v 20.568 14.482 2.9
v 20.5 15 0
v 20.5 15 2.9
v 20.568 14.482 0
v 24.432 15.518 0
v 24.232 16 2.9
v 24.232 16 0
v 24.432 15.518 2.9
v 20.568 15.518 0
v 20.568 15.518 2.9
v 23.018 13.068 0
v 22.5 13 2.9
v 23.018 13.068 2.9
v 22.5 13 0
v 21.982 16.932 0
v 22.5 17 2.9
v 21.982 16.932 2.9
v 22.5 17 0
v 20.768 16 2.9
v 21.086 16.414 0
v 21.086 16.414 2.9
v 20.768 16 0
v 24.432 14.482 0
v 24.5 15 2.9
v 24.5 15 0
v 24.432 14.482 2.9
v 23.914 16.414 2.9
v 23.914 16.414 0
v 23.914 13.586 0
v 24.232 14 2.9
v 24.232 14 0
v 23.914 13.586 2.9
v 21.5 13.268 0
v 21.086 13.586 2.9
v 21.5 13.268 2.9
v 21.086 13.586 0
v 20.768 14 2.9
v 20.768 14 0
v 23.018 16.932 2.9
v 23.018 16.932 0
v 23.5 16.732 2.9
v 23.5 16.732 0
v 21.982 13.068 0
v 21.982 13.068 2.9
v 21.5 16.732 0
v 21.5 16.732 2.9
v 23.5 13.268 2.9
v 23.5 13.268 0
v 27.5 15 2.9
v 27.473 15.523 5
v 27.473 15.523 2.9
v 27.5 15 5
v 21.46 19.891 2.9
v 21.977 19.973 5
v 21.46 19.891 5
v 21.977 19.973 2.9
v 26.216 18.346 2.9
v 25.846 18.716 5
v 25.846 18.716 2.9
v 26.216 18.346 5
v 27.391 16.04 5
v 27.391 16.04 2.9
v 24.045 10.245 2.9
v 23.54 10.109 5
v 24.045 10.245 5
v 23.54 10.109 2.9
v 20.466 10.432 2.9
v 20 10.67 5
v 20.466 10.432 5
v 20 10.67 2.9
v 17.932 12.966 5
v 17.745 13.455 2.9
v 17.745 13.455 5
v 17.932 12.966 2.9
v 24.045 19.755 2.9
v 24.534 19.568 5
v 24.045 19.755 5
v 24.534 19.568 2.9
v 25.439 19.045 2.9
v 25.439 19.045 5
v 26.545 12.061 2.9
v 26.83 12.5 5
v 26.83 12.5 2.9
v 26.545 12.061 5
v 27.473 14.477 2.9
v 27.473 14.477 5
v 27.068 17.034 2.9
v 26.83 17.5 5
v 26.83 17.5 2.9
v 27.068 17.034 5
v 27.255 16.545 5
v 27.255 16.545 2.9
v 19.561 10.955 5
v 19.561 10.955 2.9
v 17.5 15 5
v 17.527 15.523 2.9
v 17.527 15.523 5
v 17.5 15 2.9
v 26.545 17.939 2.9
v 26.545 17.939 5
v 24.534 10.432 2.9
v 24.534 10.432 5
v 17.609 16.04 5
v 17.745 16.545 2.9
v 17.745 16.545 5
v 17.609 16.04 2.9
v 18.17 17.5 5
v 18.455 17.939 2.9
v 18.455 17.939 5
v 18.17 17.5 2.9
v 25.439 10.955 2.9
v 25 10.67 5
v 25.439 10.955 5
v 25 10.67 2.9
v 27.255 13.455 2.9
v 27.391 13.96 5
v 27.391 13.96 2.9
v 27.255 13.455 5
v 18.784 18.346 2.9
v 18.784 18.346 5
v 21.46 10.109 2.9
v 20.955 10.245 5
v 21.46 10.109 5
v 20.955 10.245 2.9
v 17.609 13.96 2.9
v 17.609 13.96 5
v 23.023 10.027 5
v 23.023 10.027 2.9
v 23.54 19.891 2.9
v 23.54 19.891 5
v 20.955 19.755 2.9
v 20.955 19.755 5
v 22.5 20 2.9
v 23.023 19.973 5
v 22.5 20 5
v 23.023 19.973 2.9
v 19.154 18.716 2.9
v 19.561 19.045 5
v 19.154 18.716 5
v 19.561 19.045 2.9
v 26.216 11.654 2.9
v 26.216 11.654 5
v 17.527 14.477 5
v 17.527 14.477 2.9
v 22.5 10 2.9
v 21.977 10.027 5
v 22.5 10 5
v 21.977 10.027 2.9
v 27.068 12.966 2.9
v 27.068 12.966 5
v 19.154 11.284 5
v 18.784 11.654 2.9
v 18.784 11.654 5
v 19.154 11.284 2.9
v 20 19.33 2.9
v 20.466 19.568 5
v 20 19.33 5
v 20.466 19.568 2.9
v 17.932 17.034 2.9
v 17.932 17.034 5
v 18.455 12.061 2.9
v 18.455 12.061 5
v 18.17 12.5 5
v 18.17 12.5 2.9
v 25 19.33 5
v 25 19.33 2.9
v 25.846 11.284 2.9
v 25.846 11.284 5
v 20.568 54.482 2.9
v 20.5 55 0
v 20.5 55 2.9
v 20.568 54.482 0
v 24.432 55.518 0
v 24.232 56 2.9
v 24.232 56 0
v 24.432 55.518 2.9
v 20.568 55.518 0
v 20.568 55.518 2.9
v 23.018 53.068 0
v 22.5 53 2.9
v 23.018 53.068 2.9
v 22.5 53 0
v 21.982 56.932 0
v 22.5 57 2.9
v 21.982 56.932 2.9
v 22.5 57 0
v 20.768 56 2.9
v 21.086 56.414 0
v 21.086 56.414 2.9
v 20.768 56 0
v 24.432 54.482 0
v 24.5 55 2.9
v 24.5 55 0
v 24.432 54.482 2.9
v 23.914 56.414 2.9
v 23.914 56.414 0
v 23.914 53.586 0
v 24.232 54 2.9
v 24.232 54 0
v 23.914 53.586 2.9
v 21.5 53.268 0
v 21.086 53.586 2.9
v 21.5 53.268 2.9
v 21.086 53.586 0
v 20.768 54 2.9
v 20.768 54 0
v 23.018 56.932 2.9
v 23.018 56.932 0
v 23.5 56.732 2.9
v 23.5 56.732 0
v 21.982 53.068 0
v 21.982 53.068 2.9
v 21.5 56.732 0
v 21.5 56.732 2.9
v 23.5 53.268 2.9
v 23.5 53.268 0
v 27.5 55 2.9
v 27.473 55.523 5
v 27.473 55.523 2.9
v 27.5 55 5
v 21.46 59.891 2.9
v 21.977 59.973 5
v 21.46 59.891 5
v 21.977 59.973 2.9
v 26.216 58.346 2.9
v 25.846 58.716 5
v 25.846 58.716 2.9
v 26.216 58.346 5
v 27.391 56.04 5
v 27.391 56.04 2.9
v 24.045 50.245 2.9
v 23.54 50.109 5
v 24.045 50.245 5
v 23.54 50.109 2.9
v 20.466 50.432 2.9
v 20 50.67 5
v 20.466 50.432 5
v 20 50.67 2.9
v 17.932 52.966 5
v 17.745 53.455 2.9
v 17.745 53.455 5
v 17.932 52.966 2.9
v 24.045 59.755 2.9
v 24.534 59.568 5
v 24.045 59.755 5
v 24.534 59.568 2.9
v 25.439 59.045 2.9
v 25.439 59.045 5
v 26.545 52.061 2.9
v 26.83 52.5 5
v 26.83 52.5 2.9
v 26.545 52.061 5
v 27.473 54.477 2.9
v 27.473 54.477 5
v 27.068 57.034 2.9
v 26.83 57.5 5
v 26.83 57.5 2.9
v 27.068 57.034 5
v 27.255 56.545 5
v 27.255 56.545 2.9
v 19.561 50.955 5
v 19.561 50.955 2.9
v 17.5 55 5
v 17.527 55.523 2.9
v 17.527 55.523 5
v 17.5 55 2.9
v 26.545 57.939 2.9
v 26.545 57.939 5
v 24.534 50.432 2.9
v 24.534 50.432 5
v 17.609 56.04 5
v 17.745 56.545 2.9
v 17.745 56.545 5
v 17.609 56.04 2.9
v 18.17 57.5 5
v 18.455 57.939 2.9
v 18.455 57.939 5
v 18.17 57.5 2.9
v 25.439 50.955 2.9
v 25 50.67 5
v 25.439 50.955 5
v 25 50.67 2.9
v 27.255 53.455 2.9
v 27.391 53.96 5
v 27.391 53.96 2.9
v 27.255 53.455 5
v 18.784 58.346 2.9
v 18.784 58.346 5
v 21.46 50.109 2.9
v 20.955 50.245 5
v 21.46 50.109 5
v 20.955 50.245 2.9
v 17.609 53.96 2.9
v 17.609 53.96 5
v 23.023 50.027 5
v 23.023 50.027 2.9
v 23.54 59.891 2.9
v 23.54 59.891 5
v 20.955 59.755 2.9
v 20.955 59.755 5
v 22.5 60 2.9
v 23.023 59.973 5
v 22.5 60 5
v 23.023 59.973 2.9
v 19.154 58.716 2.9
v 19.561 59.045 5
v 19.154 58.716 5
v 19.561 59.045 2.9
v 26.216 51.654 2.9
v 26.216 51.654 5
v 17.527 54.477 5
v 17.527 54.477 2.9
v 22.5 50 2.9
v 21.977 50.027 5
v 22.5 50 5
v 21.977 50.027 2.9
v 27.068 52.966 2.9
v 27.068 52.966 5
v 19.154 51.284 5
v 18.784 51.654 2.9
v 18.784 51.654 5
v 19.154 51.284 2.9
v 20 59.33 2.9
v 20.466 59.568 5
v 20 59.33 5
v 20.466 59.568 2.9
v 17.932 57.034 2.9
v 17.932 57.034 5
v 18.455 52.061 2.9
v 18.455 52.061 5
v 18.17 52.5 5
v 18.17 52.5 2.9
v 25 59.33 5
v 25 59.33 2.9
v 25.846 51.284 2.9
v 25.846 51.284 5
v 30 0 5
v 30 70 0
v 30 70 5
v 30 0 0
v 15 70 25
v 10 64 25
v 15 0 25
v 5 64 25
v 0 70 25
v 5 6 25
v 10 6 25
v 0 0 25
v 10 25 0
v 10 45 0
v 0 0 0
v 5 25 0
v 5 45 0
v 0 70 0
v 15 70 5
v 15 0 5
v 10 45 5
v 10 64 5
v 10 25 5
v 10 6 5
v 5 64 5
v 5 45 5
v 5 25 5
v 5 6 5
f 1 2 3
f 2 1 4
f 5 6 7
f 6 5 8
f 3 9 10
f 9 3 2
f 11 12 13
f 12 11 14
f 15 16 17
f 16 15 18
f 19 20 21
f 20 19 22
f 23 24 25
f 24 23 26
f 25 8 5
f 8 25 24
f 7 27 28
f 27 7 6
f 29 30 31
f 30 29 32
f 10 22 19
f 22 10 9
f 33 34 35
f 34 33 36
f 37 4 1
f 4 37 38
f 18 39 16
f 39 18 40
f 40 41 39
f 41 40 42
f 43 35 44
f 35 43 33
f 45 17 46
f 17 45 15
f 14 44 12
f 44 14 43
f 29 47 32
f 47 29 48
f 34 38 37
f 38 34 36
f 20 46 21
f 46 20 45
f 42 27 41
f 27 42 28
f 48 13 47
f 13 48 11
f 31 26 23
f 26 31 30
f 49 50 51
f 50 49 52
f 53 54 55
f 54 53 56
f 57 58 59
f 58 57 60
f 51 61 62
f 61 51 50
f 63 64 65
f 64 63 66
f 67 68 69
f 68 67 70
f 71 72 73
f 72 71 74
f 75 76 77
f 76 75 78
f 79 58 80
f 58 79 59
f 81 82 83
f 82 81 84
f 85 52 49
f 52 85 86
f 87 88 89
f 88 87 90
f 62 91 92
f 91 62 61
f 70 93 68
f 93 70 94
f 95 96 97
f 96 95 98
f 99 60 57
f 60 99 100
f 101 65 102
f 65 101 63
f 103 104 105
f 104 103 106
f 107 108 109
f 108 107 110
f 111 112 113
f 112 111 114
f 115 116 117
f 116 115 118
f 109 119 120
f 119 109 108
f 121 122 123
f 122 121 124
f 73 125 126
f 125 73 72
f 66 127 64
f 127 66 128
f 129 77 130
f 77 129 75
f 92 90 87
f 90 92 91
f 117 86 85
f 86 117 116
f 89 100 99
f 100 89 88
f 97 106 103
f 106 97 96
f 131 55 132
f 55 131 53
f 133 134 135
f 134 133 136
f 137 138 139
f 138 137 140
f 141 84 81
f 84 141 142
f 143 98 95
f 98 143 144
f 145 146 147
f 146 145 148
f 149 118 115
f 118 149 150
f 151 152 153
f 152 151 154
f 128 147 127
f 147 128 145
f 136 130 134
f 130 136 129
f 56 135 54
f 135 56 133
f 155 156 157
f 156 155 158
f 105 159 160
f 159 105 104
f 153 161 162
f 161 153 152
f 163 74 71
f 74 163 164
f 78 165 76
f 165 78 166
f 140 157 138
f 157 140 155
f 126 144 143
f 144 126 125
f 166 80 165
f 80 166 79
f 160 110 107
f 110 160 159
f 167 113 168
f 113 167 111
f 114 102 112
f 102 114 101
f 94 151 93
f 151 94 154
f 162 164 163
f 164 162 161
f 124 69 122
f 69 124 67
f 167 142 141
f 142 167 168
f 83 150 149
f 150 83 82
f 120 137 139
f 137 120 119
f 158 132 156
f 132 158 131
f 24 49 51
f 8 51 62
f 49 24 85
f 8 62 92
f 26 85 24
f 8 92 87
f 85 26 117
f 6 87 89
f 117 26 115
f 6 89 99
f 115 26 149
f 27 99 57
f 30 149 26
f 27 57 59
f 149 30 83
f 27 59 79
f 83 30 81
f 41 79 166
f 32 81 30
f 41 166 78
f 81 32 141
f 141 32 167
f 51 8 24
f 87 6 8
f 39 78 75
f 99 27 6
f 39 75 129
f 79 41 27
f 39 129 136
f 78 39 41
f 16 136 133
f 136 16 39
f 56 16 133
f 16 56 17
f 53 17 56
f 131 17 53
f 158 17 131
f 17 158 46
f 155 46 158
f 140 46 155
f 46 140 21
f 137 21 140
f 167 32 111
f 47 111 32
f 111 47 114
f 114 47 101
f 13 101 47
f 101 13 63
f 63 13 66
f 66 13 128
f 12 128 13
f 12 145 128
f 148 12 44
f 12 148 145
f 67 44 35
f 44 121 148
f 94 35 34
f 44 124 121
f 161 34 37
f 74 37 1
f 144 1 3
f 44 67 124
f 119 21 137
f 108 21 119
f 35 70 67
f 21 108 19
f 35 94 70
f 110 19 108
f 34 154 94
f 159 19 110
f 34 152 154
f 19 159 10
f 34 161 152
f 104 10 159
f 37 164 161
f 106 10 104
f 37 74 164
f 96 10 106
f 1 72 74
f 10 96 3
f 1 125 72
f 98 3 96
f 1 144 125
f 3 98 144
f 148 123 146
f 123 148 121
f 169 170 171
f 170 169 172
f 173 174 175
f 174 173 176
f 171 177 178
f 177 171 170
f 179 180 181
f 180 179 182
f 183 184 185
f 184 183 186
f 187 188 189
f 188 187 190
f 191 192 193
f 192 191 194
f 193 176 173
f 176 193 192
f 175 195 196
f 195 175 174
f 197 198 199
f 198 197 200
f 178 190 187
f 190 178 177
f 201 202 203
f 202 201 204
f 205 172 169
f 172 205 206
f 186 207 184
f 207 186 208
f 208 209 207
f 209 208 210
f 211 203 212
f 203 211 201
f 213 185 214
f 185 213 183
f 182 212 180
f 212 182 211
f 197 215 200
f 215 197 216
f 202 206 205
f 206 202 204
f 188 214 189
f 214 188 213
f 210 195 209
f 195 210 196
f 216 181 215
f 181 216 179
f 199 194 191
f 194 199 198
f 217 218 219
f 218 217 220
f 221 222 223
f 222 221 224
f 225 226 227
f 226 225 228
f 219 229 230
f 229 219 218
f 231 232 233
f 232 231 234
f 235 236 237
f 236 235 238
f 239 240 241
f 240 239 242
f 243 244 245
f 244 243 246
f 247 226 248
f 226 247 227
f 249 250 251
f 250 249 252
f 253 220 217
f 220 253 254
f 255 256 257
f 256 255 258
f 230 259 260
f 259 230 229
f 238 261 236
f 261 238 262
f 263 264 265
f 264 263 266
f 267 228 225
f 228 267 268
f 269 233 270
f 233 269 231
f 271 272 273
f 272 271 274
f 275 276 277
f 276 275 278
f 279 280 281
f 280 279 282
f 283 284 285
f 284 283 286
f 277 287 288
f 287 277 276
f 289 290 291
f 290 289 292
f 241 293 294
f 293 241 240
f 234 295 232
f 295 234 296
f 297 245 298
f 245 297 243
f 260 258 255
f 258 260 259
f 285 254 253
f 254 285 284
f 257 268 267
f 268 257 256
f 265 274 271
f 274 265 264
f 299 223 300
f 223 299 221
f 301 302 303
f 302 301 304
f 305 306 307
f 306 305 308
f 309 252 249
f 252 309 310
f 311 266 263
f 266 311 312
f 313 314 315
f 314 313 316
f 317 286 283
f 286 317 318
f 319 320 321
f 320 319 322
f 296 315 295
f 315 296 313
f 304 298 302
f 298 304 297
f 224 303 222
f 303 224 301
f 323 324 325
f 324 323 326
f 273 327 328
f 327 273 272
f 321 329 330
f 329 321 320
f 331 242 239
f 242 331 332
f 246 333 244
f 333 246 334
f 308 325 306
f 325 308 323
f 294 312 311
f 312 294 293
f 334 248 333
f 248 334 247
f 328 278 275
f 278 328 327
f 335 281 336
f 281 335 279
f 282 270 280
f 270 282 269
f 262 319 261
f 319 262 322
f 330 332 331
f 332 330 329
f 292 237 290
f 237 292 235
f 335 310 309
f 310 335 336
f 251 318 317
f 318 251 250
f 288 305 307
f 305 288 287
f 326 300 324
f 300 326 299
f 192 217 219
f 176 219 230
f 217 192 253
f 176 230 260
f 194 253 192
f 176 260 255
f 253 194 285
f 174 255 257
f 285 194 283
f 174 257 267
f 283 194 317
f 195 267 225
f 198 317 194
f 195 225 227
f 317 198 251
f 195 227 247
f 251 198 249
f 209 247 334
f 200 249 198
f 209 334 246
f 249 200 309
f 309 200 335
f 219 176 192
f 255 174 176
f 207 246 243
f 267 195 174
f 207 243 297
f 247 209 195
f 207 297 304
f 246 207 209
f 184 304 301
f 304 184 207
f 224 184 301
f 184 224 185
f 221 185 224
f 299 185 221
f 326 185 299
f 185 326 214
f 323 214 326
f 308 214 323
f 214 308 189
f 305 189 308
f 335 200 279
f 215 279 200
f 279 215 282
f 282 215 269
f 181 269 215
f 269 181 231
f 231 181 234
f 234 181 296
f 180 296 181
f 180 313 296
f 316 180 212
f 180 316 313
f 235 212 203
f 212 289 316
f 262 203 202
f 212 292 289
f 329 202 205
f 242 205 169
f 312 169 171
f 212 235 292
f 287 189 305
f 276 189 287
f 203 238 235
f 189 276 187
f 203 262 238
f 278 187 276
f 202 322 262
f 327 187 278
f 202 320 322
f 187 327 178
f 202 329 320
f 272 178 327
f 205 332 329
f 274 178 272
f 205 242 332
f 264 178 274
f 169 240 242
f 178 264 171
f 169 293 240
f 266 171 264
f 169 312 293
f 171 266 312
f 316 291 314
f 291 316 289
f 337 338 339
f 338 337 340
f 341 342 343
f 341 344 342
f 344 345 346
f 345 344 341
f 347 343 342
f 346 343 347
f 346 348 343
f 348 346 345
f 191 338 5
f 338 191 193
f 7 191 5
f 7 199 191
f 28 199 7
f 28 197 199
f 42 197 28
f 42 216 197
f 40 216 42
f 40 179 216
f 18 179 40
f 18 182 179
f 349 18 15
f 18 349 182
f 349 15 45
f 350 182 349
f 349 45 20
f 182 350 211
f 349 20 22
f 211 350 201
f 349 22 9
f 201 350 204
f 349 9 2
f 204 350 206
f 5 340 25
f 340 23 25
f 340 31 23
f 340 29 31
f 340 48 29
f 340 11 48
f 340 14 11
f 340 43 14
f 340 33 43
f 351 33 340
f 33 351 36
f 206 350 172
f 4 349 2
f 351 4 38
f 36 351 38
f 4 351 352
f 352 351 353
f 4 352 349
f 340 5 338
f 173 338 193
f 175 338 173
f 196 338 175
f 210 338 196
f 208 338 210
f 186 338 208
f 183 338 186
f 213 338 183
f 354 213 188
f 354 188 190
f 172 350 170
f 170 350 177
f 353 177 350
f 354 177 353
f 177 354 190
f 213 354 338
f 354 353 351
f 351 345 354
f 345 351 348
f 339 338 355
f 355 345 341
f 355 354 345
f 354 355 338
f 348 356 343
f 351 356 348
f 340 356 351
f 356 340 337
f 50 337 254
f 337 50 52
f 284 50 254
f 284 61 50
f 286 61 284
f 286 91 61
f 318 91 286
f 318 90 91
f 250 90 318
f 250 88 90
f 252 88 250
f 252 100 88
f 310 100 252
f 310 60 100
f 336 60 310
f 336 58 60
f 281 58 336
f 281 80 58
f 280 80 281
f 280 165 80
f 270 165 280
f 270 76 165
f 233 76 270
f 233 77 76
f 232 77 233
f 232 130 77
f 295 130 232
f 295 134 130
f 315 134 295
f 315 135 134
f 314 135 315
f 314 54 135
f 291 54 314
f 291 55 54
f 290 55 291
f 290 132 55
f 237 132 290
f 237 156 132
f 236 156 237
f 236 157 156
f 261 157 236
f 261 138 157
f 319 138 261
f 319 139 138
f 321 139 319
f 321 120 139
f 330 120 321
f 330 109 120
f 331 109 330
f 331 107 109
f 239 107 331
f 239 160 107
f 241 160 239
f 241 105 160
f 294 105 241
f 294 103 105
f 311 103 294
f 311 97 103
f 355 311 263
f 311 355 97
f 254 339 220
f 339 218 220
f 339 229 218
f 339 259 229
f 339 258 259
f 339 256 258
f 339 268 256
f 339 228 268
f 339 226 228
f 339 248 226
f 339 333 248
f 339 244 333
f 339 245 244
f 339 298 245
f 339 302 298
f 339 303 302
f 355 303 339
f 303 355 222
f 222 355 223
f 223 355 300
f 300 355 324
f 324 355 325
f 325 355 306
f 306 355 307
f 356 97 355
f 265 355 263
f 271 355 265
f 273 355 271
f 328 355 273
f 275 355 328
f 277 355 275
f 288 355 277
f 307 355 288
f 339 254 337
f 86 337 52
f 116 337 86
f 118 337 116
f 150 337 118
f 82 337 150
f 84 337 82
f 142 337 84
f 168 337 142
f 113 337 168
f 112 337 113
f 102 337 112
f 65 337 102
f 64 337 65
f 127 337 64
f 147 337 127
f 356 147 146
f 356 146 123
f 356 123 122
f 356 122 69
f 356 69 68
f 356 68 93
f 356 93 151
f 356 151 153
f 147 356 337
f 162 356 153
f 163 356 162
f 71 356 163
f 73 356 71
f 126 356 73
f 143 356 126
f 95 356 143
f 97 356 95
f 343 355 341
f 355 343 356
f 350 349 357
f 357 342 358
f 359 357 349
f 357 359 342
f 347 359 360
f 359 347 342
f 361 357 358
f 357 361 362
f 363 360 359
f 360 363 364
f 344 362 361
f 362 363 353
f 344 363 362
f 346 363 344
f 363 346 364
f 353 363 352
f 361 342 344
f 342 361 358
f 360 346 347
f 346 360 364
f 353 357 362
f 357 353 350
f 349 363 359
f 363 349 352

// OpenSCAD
difference(){
    cube([30,70,25]);
    translate([15,-0.5,5])cube([30,71,30]);
    translate([5, 6, 5])cube([5,58,30]);
    translate([5, 25, -0.5])cube([5,20,30]);
    translate([22.5,0,0]){
        translate([0,15,-.1])csavarfurat();
        translate([0,55,-.1])csavarfurat();
    }
}

module csavarfurat(){
    cylinder(r=2, h=4,$fn=24);
    translate([0,0,3])cylinder(r=5,h=2.2,$fn=60);
}
    
      
